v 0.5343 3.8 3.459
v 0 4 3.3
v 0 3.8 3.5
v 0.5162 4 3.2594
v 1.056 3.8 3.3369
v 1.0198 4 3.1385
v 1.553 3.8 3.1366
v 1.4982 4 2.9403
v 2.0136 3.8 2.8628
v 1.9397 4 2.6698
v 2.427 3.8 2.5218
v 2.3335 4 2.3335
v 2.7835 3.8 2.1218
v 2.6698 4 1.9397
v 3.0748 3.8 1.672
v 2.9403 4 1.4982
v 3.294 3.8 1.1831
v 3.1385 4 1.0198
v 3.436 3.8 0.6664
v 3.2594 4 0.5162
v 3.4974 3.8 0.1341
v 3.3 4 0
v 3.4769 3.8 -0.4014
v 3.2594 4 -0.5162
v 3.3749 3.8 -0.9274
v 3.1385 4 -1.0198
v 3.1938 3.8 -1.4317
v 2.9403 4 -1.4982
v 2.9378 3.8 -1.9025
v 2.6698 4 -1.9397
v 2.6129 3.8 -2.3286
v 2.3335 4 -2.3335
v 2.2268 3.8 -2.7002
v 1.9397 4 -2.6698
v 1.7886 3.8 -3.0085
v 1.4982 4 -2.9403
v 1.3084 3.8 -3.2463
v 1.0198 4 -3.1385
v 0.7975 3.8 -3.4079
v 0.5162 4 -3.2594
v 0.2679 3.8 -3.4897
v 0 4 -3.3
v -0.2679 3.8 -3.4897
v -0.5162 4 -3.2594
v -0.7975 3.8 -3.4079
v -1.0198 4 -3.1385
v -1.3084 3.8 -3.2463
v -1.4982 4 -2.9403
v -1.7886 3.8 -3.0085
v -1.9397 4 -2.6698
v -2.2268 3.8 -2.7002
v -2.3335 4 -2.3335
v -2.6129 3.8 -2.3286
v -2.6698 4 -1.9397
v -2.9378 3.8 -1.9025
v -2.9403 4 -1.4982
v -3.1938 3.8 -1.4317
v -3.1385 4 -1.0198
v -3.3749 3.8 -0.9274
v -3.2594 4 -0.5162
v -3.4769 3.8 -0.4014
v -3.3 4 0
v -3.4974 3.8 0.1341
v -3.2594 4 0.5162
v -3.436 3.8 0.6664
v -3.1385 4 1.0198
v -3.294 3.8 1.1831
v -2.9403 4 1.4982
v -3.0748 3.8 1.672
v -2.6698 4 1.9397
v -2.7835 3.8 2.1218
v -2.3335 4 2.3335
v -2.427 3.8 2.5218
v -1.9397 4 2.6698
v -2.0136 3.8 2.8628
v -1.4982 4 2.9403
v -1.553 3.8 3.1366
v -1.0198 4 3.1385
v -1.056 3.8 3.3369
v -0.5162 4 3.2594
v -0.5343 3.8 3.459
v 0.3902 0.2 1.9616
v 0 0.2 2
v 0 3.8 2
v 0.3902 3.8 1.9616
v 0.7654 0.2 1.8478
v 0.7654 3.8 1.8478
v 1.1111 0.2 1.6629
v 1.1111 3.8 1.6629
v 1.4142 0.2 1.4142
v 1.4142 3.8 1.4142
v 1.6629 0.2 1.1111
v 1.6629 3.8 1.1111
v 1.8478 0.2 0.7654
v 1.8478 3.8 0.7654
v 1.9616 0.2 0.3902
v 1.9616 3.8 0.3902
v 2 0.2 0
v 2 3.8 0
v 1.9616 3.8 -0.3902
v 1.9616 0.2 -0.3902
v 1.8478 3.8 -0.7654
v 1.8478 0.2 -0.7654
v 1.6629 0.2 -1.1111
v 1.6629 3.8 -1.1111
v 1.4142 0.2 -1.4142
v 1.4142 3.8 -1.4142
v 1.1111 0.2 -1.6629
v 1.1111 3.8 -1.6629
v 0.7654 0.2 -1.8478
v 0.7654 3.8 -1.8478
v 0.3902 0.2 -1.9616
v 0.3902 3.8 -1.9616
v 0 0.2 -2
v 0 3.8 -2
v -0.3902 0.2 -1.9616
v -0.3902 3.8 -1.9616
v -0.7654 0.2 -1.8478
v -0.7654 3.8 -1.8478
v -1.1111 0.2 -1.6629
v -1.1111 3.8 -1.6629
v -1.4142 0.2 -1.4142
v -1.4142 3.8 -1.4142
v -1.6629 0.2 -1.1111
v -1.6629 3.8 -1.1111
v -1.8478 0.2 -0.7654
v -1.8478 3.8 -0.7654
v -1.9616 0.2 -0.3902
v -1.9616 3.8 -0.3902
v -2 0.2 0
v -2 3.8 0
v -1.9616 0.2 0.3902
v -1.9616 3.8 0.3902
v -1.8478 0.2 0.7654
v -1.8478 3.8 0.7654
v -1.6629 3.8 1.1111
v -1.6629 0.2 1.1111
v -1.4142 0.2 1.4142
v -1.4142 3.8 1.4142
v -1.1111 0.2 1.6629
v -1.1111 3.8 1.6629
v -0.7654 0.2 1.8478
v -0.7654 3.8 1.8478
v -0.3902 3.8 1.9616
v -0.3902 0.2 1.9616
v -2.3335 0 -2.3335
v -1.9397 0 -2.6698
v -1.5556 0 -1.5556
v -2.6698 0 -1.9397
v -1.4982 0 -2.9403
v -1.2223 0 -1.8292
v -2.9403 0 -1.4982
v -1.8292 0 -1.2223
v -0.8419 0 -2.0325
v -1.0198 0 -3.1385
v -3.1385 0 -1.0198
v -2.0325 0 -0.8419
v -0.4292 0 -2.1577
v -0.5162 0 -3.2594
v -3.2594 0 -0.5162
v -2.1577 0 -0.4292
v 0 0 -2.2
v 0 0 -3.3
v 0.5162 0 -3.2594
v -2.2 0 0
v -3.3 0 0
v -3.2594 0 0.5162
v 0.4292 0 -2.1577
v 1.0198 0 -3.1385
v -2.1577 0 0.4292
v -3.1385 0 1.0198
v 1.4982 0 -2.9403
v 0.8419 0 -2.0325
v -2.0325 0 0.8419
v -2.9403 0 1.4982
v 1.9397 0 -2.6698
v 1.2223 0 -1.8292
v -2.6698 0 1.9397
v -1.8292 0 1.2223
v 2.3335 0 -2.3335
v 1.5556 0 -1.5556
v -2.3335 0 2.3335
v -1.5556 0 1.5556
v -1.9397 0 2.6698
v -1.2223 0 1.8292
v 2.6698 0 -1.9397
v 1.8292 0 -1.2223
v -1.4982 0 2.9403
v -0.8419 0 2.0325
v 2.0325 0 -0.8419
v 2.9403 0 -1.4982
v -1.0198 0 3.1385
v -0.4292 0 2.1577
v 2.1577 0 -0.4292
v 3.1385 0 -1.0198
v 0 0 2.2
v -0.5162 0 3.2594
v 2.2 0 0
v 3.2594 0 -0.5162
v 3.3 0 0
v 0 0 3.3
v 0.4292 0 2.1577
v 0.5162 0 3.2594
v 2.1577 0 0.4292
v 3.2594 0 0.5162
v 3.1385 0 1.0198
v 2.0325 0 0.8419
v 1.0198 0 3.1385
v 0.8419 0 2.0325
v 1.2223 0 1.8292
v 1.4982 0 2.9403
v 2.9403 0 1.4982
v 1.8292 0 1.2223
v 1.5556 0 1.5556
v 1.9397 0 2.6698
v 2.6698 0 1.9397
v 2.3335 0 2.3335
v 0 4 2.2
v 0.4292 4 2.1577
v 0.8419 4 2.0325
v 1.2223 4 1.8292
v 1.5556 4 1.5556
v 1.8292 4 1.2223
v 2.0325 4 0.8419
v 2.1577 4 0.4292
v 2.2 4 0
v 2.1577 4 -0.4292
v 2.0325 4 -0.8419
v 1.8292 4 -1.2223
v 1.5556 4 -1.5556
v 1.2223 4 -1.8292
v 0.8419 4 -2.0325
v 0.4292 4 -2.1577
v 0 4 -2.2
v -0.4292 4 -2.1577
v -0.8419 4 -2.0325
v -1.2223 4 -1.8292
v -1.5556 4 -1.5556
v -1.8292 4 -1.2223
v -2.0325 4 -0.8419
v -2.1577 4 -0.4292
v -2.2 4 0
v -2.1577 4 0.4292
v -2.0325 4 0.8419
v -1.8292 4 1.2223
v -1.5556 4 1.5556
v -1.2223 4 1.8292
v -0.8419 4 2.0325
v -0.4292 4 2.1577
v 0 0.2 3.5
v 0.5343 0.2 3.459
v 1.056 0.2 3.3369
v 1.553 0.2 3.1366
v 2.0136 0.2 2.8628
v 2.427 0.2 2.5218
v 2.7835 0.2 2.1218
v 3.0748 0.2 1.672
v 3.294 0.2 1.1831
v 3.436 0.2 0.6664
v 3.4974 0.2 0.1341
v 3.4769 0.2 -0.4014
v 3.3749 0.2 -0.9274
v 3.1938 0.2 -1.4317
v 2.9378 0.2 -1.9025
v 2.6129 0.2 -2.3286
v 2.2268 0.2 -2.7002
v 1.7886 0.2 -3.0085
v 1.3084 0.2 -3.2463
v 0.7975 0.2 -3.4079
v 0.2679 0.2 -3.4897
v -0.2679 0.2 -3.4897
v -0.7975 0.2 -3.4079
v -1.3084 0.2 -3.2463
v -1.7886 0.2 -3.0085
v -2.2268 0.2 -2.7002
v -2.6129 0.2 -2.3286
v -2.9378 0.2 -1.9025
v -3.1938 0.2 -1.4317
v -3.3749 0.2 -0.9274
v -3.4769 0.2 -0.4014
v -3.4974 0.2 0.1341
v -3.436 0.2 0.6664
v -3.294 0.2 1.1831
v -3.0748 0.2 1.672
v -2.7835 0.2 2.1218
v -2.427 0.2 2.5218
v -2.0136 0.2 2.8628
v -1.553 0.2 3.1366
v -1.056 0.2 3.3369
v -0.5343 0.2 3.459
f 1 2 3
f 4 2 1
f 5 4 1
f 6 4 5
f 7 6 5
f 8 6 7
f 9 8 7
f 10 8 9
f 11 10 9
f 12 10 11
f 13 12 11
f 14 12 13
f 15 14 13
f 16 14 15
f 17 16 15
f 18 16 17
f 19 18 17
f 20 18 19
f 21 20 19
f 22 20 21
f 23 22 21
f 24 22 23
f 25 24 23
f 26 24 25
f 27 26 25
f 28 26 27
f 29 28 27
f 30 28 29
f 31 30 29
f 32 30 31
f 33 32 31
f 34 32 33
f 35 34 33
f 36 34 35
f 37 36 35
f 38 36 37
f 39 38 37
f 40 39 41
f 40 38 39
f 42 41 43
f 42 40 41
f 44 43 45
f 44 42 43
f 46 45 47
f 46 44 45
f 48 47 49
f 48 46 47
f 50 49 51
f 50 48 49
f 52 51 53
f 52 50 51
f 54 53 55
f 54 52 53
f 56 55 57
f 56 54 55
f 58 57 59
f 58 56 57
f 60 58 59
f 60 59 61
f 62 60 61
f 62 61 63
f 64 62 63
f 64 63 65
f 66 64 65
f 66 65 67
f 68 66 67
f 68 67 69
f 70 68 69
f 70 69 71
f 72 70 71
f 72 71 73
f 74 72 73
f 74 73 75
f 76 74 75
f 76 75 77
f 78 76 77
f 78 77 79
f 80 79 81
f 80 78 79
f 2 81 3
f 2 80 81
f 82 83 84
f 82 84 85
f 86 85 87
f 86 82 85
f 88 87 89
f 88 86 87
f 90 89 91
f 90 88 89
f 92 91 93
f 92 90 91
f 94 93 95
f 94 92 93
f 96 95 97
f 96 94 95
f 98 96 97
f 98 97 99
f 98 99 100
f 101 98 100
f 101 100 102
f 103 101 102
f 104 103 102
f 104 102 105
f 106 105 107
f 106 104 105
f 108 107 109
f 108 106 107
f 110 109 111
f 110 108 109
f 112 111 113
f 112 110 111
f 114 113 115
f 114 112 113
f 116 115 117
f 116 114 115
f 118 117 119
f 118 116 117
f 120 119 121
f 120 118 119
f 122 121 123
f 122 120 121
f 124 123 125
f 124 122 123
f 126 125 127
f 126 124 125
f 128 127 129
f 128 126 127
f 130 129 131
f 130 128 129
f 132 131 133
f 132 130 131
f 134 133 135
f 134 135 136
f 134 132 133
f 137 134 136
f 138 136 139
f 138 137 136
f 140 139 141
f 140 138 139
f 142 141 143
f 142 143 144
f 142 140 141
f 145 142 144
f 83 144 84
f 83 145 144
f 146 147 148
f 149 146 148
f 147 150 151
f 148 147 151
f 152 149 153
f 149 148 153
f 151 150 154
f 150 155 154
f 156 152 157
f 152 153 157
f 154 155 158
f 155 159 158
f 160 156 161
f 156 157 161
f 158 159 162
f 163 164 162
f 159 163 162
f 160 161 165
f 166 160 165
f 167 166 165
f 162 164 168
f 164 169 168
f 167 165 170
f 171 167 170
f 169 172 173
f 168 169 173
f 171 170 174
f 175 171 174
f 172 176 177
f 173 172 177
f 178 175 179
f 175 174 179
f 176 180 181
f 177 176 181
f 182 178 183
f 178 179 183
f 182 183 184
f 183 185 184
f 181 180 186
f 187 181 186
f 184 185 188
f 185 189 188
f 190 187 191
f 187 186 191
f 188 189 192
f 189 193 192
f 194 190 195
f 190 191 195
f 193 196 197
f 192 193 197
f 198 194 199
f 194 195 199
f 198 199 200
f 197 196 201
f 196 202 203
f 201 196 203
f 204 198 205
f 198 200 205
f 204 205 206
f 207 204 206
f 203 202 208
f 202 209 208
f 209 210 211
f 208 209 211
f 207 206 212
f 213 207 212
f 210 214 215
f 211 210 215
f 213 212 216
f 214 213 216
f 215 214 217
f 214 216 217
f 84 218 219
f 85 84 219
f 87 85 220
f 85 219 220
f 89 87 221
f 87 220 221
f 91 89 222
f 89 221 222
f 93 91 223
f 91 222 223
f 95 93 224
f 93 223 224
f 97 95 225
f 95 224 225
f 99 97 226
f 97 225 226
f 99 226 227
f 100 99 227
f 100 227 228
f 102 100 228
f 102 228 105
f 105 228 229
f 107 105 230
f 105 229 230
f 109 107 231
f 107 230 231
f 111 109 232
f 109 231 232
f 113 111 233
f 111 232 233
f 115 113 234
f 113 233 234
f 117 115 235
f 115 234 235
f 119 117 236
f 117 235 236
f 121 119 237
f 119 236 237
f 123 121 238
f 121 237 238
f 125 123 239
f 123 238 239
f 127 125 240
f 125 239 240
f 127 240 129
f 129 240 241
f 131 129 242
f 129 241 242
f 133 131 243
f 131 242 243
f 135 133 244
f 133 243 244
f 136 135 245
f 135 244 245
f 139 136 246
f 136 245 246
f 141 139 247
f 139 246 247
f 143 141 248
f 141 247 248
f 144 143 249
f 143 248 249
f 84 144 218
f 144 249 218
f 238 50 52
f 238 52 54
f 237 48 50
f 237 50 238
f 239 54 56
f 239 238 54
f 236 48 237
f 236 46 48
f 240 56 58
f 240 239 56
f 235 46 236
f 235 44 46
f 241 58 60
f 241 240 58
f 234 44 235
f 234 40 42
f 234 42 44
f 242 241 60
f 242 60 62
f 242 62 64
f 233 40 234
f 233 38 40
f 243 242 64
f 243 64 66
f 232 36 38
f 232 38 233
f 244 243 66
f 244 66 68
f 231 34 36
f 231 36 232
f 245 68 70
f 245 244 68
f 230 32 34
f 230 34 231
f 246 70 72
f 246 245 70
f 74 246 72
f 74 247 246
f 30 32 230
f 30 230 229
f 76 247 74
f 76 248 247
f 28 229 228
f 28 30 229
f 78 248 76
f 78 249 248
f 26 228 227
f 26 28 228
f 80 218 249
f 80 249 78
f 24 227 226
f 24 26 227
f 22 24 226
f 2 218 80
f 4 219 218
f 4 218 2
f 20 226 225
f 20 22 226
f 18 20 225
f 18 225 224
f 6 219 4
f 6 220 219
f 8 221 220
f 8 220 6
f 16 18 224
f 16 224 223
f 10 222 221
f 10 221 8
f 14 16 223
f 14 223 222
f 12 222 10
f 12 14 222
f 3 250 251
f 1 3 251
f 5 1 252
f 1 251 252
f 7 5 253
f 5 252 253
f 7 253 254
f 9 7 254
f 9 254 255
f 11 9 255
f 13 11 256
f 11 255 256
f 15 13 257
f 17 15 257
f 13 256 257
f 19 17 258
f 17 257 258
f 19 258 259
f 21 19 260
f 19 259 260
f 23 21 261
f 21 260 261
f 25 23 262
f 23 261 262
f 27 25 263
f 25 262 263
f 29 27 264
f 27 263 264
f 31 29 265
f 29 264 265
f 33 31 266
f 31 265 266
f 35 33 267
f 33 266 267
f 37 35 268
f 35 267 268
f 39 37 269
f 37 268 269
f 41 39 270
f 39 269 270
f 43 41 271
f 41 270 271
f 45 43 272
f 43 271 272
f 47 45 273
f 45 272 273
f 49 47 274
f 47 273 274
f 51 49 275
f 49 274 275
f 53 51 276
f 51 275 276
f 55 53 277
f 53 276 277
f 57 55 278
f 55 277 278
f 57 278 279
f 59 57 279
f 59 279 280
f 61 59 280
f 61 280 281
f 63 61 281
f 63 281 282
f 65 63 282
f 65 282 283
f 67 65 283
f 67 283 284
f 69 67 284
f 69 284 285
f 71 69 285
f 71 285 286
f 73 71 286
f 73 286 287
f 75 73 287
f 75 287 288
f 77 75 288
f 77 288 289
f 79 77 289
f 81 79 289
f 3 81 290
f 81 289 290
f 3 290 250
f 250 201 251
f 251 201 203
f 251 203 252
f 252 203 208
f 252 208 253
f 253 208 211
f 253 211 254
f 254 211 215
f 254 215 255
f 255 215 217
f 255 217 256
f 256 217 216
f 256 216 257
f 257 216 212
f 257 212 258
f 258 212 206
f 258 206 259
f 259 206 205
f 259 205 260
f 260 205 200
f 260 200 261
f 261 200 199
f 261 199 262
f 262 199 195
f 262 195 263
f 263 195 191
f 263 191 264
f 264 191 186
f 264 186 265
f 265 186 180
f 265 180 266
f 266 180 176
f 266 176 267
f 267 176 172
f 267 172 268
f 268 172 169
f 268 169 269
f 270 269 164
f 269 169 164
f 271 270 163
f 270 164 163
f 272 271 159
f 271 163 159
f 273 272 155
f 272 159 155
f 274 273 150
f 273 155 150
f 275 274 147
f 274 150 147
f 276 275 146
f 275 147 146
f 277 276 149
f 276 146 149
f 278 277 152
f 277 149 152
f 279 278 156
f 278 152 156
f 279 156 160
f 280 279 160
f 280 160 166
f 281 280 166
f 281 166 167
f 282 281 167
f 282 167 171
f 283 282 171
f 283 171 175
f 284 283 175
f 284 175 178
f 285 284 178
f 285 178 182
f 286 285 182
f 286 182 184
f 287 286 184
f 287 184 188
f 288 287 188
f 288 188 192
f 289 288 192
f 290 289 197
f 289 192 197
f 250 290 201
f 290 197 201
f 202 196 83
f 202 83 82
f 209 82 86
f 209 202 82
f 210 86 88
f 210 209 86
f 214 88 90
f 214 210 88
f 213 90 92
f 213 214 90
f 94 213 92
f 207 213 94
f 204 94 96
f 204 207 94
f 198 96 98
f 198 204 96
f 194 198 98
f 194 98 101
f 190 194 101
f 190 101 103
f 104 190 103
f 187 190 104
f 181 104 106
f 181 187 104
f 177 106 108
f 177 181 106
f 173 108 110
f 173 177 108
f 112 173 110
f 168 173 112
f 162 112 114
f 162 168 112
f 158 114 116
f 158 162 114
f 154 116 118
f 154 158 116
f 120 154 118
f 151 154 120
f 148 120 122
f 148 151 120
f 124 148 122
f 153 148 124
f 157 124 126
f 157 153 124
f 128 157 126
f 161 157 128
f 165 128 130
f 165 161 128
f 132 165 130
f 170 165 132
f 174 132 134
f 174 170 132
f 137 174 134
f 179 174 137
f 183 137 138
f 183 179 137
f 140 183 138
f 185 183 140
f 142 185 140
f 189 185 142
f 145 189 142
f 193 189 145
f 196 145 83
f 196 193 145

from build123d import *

# Parameters (mm, degrees)
SZKIC1_R                    = 3.5
SZKIC1_R_2                  = 2
DODANIE_WYCI_GNI_CIE1_DEPTH = 4
SFAZOWANIE1_SIZE            = 0.2


with BuildPart() as part:
    # Szkic1 → Dodanie-wyciągnięcie1 (new body)
    with BuildSketch(Plane(origin=(0, 0, 0), x_dir=(1, 0, 0), z_dir=(0, 1, 0))):
        with Locations(Location((0, 0, 0), (0, 0, 270))):
            Circle(SZKIC1_R)
        with Locations(Location((0, 0, 0), (0, 0, 270))):
            Circle(SZKIC1_R_2, mode=Mode.SUBTRACT)
    extrude(amount=DODANIE_WYCI_GNI_CIE1_DEPTH)

    # Sfazowanie1
    sfazowanie1_edges = [part.edges().sort_by_distance(p)[0] for p in [
        (0, 0, -3.5),
        (0, 4, -3.5),
        (0, 0, -2),
        (0, 4, -2),
    ]]
    chamfer(sfazowanie1_edges, length=SFAZOWANIE1_SIZE)


solid = part.part
